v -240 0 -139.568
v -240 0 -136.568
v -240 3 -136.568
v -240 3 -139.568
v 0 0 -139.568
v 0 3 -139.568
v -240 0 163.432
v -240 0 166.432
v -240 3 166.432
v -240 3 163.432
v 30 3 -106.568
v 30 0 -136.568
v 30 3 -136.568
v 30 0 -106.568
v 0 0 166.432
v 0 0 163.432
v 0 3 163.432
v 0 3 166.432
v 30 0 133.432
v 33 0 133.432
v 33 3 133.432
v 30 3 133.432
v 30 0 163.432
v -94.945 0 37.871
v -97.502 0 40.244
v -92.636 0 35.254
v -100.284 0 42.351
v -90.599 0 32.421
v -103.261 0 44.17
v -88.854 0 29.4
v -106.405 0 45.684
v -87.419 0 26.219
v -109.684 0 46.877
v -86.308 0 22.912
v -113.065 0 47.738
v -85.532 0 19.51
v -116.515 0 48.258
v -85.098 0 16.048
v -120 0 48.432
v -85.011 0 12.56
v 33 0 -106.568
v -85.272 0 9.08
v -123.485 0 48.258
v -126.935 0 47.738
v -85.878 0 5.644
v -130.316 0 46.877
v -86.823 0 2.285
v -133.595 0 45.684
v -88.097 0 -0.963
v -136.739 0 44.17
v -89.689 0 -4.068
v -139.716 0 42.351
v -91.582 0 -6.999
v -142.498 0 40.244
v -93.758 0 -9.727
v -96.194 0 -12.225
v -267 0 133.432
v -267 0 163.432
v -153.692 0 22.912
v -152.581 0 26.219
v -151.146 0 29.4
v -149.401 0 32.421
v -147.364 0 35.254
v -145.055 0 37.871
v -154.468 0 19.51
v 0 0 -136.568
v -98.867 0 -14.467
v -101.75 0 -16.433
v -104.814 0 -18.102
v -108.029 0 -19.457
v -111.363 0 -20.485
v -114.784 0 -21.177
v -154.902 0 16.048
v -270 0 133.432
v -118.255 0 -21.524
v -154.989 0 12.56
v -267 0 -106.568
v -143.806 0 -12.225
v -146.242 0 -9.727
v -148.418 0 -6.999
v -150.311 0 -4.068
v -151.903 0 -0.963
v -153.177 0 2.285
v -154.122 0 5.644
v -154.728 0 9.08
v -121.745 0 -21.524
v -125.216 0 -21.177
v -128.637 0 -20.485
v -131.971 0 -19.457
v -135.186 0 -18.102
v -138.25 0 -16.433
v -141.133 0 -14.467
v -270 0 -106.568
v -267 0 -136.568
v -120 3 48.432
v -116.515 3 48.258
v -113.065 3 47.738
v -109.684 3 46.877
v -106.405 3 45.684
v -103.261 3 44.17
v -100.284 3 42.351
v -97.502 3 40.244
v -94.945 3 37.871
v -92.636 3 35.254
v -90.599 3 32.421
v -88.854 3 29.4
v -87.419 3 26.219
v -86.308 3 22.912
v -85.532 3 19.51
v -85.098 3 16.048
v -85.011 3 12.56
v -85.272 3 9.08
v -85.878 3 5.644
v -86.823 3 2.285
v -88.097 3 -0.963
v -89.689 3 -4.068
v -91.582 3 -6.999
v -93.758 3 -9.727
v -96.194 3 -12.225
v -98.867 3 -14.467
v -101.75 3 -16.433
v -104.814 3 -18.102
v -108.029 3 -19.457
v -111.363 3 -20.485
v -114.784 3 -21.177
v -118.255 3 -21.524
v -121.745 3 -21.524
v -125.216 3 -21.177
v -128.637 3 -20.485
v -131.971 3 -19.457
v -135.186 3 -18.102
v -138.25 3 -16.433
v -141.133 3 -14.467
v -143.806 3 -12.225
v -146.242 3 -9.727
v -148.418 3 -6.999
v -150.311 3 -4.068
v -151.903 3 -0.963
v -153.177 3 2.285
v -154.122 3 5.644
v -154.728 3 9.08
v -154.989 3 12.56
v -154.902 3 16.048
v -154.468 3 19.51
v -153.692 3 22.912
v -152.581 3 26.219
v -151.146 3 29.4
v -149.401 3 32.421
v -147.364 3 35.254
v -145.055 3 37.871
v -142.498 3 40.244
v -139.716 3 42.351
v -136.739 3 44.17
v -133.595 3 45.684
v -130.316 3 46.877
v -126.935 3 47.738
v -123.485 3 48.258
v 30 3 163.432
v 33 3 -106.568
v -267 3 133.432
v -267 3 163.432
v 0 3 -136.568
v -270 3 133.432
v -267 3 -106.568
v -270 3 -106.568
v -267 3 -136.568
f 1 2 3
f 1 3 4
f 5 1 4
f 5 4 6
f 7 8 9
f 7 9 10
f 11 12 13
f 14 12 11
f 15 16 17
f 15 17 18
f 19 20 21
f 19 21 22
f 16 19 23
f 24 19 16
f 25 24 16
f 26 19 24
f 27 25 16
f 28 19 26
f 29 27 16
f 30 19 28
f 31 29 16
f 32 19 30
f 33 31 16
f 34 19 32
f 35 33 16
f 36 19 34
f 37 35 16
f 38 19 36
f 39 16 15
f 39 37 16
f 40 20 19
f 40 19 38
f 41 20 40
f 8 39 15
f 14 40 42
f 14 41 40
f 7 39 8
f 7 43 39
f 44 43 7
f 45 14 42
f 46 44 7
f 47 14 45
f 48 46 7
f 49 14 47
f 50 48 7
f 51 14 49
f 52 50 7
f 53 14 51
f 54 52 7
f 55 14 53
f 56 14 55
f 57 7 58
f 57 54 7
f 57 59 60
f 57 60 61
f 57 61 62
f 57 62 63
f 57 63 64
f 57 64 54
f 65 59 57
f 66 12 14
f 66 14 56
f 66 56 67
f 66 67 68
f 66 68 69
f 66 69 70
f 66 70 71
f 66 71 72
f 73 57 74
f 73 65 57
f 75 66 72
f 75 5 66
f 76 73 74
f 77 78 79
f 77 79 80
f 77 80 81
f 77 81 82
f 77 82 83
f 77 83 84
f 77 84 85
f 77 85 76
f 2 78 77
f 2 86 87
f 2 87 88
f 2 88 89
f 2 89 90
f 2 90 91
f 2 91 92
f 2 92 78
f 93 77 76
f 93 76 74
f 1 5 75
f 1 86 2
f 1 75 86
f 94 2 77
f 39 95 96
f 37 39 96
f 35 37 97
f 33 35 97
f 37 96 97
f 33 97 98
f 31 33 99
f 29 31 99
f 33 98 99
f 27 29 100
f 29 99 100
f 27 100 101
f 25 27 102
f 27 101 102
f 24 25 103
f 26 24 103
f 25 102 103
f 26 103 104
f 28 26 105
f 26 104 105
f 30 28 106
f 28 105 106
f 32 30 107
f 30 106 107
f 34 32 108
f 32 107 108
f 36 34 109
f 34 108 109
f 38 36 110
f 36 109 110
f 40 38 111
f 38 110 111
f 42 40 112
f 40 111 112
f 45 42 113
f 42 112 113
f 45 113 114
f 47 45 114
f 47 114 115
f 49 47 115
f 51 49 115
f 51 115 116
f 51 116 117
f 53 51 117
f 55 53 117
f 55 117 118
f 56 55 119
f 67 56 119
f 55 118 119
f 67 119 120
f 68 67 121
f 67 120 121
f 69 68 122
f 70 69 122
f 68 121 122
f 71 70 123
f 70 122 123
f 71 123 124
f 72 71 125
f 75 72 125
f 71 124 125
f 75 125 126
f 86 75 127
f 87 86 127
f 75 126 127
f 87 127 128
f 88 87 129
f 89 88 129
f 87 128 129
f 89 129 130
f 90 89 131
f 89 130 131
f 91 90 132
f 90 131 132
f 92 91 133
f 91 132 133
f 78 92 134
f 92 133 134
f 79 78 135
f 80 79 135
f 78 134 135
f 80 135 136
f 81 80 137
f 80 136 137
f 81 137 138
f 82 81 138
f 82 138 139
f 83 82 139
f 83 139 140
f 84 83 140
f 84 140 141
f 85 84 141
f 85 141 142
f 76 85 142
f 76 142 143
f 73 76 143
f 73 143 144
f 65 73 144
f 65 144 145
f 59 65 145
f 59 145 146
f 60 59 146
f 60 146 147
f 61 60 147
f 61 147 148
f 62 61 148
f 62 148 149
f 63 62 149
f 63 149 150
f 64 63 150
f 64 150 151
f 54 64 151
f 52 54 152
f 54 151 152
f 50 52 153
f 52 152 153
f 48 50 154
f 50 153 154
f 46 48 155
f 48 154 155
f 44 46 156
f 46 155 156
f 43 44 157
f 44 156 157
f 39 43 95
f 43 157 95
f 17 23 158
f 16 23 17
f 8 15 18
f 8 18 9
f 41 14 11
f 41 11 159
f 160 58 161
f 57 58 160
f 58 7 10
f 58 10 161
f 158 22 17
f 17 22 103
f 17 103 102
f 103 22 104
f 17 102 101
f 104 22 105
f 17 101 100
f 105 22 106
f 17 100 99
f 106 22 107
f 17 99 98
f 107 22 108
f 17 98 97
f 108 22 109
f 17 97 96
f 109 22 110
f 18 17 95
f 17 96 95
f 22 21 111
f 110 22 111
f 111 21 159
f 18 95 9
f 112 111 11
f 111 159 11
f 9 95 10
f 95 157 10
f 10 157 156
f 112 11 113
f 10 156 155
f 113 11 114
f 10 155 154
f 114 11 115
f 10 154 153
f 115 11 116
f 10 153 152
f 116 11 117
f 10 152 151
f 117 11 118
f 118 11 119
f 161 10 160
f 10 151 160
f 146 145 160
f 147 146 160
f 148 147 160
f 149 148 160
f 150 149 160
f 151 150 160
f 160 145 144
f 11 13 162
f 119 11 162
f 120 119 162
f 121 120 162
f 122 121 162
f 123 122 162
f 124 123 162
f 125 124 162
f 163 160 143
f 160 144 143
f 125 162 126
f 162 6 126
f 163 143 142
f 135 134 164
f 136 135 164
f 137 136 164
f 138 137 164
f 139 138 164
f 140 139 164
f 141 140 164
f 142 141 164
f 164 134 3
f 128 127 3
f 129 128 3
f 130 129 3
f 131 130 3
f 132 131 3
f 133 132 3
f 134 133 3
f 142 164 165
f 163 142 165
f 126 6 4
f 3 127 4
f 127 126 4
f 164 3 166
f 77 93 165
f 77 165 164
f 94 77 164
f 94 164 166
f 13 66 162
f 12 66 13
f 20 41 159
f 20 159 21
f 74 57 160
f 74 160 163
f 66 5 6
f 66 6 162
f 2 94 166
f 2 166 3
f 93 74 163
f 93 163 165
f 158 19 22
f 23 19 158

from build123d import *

# Parameters (mm, degrees)
BOSS_EXTRUDE1_DEPTH = 3
SKETCH2_R           = 35
CUT_EXTRUDE1_DEPTH  = 3


with BuildPart() as part:
    # Sketch1 → Boss-Extrude1 (new body)
    with BuildSketch(Plane(origin=(0, 0, 0), x_dir=(1, 0, 0), z_dir=(0, 1, 0))):
        Polygon((-267, 136.567741935), (-240, 136.567741935), (-240, 139.567741935), (0, 139.567741935), (0, 136.567741935), (30, 136.567741935), (30, 106.567741935), (33, 106.567741935), (33, -133.432258065), (30, -133.432258065), (30, -163.432258065), (0, -163.432258065), (0, -166.432258065), (-240, -166.432258065), (-240, -163.432258065), (-267, -163.432258065), (-267, -133.432258065), (-270, -133.432258065), (-270, 106.567741935), (-267, 106.567741935), align=None)
    extrude(amount=BOSS_EXTRUDE1_DEPTH)

    # Sketch2 → Cut-Extrude1 (cut)
    with BuildSketch(Plane(origin=(0, 3, 0), x_dir=(1, 0, 0), z_dir=(0, 1, 0))):
        with Locations(Location((-120, -13.432258065, 0), (0, 0, 270))):
            Circle(SKETCH2_R)
    extrude(amount=-CUT_EXTRUDE1_DEPTH, mode=Mode.SUBTRACT)


solid = part.part
